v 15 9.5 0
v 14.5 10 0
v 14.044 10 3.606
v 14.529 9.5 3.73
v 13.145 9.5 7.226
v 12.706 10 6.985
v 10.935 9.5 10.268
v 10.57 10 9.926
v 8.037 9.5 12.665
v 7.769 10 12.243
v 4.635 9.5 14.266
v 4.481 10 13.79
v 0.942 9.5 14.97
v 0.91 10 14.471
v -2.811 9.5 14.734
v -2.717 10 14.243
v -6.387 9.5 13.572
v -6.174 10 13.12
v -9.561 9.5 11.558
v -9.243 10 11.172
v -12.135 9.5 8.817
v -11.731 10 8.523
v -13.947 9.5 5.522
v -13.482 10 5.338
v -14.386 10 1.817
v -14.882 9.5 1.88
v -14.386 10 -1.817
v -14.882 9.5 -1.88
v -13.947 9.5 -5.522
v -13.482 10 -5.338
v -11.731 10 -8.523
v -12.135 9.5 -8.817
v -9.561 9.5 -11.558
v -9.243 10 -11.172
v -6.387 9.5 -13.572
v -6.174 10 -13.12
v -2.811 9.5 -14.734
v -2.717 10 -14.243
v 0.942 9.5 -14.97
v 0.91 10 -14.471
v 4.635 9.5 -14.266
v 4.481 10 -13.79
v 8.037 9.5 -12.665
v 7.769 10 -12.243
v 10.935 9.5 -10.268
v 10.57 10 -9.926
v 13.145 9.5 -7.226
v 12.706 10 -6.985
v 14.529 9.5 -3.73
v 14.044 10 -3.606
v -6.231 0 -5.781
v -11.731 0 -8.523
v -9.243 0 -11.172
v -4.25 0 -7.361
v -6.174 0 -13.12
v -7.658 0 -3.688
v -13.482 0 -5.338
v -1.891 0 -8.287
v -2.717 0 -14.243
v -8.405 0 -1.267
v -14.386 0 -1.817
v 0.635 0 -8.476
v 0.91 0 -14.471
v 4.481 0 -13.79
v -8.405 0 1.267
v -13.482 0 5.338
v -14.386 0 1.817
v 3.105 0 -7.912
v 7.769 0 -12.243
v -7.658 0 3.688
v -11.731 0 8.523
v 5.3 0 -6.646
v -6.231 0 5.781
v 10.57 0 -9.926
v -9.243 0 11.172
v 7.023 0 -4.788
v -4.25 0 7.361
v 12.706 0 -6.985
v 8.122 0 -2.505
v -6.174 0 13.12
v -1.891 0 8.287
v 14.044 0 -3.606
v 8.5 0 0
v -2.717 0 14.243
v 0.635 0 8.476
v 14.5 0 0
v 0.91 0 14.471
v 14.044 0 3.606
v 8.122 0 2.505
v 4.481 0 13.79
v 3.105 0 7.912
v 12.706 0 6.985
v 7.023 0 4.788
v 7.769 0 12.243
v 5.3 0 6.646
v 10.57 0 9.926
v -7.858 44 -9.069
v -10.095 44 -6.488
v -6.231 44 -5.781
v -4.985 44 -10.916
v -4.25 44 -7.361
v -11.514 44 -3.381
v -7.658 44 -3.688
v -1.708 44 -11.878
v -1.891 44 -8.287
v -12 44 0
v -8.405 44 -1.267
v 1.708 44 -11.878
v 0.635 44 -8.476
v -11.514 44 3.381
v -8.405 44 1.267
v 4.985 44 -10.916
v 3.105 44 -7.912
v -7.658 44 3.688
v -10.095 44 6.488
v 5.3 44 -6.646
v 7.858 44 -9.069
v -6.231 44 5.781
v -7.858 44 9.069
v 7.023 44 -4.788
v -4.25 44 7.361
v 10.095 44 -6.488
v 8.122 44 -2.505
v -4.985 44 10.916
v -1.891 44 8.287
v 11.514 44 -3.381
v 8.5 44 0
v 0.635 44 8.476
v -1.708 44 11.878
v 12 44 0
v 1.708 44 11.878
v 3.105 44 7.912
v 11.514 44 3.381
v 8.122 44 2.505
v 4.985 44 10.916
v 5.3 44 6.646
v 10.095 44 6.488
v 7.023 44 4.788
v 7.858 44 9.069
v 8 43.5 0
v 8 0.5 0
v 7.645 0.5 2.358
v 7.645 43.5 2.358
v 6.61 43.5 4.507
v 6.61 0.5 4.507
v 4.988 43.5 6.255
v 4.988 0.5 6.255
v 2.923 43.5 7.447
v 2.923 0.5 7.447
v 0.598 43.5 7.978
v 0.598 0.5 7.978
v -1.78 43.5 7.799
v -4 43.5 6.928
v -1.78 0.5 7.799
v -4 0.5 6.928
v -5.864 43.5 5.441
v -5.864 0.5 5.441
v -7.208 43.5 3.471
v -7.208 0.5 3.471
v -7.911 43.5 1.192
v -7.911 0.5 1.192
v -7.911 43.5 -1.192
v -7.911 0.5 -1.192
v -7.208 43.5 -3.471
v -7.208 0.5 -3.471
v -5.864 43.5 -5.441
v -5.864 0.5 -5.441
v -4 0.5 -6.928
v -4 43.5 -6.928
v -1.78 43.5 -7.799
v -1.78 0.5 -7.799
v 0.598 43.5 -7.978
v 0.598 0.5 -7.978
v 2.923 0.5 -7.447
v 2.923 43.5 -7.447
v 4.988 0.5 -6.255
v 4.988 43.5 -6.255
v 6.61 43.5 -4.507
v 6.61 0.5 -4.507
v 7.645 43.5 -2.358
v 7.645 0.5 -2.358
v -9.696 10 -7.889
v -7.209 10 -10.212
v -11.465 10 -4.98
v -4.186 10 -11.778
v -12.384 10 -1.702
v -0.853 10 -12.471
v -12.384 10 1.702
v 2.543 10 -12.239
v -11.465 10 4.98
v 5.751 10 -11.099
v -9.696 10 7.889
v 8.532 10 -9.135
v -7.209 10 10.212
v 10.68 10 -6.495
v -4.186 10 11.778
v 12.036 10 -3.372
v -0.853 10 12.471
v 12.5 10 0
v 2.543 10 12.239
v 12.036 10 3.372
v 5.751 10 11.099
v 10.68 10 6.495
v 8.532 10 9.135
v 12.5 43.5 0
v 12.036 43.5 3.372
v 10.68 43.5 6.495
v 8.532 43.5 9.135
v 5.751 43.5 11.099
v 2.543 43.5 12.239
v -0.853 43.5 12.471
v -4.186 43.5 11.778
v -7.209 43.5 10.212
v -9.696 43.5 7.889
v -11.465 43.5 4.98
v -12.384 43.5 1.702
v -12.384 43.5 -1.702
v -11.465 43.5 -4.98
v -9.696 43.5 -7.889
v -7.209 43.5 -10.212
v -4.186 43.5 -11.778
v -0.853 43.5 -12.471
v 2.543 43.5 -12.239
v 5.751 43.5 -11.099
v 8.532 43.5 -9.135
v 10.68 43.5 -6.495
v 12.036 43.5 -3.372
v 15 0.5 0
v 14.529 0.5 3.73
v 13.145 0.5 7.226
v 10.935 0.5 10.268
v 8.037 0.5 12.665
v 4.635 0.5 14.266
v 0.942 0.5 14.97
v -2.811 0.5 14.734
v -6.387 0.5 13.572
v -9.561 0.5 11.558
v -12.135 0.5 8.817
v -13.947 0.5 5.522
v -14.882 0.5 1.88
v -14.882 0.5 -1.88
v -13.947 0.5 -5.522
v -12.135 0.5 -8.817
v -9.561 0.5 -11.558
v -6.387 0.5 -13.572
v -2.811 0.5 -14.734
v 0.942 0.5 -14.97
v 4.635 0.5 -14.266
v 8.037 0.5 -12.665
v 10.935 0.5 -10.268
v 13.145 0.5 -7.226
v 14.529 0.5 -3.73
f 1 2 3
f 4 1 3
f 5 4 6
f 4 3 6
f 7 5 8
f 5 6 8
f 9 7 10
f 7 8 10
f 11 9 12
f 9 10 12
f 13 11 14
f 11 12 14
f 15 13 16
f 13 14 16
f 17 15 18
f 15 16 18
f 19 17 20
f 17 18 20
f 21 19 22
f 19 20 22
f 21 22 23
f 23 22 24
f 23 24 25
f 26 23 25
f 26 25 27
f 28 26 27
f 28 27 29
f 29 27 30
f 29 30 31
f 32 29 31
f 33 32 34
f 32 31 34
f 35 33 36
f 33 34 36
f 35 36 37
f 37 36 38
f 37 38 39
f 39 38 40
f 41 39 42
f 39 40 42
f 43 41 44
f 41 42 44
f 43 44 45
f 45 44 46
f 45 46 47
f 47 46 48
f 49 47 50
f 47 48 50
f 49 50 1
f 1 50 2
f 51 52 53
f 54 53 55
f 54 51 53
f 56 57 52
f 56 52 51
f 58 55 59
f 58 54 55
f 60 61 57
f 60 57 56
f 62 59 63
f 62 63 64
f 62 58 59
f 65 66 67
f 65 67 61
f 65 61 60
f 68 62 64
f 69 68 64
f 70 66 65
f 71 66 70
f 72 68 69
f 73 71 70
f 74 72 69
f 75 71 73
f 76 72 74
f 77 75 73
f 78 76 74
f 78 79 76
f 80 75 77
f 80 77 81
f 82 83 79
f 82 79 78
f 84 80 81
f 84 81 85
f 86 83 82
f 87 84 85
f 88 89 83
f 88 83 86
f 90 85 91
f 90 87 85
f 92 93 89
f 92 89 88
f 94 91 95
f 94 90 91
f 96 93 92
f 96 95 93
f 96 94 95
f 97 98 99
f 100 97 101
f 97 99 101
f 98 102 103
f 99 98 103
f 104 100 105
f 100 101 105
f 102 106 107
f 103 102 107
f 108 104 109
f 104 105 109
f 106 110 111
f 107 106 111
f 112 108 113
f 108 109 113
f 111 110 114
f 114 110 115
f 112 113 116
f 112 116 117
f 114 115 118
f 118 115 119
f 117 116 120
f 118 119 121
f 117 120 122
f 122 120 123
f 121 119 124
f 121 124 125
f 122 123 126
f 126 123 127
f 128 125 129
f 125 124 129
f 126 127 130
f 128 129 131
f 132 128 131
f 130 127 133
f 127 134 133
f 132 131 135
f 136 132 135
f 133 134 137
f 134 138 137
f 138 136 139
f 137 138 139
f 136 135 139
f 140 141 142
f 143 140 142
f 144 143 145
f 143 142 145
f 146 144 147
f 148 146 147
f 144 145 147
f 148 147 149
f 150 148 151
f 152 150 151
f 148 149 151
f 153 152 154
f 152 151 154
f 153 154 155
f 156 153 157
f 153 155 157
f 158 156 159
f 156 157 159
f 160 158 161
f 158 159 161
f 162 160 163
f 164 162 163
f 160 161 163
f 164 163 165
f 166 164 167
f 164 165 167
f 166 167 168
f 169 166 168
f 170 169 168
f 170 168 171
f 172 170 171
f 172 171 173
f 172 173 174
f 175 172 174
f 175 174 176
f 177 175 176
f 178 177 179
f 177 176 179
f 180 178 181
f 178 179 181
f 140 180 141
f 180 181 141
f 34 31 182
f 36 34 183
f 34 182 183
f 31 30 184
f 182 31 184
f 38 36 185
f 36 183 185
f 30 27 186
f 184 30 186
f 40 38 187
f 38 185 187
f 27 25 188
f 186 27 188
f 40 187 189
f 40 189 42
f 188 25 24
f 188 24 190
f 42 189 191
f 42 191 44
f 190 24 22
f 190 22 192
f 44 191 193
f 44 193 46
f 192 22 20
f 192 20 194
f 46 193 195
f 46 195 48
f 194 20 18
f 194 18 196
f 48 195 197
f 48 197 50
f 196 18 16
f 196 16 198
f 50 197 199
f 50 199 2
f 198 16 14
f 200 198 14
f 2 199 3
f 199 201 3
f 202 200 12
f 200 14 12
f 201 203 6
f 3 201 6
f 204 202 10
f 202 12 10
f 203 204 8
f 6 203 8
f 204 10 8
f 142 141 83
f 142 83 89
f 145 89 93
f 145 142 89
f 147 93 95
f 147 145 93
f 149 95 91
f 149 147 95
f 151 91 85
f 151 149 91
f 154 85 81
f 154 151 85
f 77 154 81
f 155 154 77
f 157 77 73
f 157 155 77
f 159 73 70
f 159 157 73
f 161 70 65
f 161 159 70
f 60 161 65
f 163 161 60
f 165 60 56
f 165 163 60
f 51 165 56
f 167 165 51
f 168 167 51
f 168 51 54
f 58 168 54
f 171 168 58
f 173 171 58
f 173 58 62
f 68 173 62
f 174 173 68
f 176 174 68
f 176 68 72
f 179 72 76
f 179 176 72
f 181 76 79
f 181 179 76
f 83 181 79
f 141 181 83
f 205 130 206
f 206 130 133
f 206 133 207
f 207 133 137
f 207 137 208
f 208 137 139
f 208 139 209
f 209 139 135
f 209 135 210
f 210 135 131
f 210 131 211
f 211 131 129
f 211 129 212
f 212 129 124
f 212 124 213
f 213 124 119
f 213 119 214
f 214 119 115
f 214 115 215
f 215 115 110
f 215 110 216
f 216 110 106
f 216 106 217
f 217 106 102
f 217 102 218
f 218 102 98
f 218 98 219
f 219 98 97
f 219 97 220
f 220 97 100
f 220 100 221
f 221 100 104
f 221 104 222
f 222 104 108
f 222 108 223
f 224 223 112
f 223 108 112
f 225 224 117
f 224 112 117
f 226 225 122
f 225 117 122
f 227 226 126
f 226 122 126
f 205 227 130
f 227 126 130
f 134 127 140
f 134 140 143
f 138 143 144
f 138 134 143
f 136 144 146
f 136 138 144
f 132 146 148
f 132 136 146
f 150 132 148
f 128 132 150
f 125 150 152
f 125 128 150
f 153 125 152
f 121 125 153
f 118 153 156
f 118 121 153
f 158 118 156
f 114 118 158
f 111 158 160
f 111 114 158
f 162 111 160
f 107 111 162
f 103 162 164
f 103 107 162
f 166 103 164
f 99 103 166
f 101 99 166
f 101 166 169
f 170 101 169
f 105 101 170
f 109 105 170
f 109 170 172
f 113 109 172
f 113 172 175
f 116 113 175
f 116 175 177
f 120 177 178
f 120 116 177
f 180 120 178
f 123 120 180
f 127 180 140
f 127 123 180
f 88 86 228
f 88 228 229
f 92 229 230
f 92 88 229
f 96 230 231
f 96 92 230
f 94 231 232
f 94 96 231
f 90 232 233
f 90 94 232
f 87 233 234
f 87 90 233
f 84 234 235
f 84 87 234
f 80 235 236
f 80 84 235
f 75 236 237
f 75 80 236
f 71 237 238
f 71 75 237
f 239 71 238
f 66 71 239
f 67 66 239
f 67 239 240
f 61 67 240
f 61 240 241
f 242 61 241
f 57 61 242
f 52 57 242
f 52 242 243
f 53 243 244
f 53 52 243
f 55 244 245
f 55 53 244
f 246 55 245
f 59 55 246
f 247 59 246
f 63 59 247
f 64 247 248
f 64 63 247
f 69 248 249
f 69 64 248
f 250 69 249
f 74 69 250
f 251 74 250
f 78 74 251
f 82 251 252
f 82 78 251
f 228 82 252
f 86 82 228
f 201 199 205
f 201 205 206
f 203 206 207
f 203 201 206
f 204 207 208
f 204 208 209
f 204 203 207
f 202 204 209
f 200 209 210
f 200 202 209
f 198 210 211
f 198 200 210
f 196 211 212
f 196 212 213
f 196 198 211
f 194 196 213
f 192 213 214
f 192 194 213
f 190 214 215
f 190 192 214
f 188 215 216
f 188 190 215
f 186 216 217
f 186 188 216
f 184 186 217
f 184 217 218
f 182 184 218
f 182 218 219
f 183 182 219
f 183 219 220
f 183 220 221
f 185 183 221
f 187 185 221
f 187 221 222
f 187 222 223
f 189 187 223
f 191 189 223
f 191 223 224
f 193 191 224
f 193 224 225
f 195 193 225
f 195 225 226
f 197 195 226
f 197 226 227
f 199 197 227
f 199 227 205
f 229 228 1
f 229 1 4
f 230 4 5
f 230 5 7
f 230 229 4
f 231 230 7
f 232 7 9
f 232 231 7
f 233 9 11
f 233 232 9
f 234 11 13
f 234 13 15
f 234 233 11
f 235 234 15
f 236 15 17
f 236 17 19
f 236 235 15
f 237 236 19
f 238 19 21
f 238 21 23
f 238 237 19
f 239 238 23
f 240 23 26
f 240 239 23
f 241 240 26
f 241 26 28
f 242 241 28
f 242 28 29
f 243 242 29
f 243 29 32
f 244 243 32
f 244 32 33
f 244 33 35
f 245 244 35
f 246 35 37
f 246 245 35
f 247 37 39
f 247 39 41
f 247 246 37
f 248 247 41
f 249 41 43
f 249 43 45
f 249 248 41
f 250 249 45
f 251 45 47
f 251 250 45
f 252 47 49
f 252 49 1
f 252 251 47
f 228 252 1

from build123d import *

# Parameters (mm, degrees)
F0_R     = 12.5
F0_R_2   = 8
F1_DEPTH = 44
F2_R     = 15
F2_R_2   = 12.5
F3_DEPTH = 10
F4_SIZE  = 0.5


with BuildPart() as f1:
    # F0 (on Front) → F1 (new body)
    with BuildSketch(Plane.XZ):
        Circle(F0_R)
        Circle(F0_R_2, mode=Mode.SUBTRACT)
    extrude(amount=-F1_DEPTH)

    # F2 (on Front) → F3 (join)
    with BuildSketch(Plane.XZ):
        Circle(F2_R)
        Circle(F2_R_2, mode=Mode.SUBTRACT)
    extrude(amount=-F3_DEPTH)

    # F4
    f4_edges = [f1.edges().sort_by_distance(p)[0] for p in [
        (-8, 0, 0),
        (-15, 0, 0),
        (-15, 10, 0),
        (-12.5, 44, 0),
        (-8, 44, 0),
    ]]
    chamfer(f4_edges, length=F4_SIZE)


solid = f1.part
